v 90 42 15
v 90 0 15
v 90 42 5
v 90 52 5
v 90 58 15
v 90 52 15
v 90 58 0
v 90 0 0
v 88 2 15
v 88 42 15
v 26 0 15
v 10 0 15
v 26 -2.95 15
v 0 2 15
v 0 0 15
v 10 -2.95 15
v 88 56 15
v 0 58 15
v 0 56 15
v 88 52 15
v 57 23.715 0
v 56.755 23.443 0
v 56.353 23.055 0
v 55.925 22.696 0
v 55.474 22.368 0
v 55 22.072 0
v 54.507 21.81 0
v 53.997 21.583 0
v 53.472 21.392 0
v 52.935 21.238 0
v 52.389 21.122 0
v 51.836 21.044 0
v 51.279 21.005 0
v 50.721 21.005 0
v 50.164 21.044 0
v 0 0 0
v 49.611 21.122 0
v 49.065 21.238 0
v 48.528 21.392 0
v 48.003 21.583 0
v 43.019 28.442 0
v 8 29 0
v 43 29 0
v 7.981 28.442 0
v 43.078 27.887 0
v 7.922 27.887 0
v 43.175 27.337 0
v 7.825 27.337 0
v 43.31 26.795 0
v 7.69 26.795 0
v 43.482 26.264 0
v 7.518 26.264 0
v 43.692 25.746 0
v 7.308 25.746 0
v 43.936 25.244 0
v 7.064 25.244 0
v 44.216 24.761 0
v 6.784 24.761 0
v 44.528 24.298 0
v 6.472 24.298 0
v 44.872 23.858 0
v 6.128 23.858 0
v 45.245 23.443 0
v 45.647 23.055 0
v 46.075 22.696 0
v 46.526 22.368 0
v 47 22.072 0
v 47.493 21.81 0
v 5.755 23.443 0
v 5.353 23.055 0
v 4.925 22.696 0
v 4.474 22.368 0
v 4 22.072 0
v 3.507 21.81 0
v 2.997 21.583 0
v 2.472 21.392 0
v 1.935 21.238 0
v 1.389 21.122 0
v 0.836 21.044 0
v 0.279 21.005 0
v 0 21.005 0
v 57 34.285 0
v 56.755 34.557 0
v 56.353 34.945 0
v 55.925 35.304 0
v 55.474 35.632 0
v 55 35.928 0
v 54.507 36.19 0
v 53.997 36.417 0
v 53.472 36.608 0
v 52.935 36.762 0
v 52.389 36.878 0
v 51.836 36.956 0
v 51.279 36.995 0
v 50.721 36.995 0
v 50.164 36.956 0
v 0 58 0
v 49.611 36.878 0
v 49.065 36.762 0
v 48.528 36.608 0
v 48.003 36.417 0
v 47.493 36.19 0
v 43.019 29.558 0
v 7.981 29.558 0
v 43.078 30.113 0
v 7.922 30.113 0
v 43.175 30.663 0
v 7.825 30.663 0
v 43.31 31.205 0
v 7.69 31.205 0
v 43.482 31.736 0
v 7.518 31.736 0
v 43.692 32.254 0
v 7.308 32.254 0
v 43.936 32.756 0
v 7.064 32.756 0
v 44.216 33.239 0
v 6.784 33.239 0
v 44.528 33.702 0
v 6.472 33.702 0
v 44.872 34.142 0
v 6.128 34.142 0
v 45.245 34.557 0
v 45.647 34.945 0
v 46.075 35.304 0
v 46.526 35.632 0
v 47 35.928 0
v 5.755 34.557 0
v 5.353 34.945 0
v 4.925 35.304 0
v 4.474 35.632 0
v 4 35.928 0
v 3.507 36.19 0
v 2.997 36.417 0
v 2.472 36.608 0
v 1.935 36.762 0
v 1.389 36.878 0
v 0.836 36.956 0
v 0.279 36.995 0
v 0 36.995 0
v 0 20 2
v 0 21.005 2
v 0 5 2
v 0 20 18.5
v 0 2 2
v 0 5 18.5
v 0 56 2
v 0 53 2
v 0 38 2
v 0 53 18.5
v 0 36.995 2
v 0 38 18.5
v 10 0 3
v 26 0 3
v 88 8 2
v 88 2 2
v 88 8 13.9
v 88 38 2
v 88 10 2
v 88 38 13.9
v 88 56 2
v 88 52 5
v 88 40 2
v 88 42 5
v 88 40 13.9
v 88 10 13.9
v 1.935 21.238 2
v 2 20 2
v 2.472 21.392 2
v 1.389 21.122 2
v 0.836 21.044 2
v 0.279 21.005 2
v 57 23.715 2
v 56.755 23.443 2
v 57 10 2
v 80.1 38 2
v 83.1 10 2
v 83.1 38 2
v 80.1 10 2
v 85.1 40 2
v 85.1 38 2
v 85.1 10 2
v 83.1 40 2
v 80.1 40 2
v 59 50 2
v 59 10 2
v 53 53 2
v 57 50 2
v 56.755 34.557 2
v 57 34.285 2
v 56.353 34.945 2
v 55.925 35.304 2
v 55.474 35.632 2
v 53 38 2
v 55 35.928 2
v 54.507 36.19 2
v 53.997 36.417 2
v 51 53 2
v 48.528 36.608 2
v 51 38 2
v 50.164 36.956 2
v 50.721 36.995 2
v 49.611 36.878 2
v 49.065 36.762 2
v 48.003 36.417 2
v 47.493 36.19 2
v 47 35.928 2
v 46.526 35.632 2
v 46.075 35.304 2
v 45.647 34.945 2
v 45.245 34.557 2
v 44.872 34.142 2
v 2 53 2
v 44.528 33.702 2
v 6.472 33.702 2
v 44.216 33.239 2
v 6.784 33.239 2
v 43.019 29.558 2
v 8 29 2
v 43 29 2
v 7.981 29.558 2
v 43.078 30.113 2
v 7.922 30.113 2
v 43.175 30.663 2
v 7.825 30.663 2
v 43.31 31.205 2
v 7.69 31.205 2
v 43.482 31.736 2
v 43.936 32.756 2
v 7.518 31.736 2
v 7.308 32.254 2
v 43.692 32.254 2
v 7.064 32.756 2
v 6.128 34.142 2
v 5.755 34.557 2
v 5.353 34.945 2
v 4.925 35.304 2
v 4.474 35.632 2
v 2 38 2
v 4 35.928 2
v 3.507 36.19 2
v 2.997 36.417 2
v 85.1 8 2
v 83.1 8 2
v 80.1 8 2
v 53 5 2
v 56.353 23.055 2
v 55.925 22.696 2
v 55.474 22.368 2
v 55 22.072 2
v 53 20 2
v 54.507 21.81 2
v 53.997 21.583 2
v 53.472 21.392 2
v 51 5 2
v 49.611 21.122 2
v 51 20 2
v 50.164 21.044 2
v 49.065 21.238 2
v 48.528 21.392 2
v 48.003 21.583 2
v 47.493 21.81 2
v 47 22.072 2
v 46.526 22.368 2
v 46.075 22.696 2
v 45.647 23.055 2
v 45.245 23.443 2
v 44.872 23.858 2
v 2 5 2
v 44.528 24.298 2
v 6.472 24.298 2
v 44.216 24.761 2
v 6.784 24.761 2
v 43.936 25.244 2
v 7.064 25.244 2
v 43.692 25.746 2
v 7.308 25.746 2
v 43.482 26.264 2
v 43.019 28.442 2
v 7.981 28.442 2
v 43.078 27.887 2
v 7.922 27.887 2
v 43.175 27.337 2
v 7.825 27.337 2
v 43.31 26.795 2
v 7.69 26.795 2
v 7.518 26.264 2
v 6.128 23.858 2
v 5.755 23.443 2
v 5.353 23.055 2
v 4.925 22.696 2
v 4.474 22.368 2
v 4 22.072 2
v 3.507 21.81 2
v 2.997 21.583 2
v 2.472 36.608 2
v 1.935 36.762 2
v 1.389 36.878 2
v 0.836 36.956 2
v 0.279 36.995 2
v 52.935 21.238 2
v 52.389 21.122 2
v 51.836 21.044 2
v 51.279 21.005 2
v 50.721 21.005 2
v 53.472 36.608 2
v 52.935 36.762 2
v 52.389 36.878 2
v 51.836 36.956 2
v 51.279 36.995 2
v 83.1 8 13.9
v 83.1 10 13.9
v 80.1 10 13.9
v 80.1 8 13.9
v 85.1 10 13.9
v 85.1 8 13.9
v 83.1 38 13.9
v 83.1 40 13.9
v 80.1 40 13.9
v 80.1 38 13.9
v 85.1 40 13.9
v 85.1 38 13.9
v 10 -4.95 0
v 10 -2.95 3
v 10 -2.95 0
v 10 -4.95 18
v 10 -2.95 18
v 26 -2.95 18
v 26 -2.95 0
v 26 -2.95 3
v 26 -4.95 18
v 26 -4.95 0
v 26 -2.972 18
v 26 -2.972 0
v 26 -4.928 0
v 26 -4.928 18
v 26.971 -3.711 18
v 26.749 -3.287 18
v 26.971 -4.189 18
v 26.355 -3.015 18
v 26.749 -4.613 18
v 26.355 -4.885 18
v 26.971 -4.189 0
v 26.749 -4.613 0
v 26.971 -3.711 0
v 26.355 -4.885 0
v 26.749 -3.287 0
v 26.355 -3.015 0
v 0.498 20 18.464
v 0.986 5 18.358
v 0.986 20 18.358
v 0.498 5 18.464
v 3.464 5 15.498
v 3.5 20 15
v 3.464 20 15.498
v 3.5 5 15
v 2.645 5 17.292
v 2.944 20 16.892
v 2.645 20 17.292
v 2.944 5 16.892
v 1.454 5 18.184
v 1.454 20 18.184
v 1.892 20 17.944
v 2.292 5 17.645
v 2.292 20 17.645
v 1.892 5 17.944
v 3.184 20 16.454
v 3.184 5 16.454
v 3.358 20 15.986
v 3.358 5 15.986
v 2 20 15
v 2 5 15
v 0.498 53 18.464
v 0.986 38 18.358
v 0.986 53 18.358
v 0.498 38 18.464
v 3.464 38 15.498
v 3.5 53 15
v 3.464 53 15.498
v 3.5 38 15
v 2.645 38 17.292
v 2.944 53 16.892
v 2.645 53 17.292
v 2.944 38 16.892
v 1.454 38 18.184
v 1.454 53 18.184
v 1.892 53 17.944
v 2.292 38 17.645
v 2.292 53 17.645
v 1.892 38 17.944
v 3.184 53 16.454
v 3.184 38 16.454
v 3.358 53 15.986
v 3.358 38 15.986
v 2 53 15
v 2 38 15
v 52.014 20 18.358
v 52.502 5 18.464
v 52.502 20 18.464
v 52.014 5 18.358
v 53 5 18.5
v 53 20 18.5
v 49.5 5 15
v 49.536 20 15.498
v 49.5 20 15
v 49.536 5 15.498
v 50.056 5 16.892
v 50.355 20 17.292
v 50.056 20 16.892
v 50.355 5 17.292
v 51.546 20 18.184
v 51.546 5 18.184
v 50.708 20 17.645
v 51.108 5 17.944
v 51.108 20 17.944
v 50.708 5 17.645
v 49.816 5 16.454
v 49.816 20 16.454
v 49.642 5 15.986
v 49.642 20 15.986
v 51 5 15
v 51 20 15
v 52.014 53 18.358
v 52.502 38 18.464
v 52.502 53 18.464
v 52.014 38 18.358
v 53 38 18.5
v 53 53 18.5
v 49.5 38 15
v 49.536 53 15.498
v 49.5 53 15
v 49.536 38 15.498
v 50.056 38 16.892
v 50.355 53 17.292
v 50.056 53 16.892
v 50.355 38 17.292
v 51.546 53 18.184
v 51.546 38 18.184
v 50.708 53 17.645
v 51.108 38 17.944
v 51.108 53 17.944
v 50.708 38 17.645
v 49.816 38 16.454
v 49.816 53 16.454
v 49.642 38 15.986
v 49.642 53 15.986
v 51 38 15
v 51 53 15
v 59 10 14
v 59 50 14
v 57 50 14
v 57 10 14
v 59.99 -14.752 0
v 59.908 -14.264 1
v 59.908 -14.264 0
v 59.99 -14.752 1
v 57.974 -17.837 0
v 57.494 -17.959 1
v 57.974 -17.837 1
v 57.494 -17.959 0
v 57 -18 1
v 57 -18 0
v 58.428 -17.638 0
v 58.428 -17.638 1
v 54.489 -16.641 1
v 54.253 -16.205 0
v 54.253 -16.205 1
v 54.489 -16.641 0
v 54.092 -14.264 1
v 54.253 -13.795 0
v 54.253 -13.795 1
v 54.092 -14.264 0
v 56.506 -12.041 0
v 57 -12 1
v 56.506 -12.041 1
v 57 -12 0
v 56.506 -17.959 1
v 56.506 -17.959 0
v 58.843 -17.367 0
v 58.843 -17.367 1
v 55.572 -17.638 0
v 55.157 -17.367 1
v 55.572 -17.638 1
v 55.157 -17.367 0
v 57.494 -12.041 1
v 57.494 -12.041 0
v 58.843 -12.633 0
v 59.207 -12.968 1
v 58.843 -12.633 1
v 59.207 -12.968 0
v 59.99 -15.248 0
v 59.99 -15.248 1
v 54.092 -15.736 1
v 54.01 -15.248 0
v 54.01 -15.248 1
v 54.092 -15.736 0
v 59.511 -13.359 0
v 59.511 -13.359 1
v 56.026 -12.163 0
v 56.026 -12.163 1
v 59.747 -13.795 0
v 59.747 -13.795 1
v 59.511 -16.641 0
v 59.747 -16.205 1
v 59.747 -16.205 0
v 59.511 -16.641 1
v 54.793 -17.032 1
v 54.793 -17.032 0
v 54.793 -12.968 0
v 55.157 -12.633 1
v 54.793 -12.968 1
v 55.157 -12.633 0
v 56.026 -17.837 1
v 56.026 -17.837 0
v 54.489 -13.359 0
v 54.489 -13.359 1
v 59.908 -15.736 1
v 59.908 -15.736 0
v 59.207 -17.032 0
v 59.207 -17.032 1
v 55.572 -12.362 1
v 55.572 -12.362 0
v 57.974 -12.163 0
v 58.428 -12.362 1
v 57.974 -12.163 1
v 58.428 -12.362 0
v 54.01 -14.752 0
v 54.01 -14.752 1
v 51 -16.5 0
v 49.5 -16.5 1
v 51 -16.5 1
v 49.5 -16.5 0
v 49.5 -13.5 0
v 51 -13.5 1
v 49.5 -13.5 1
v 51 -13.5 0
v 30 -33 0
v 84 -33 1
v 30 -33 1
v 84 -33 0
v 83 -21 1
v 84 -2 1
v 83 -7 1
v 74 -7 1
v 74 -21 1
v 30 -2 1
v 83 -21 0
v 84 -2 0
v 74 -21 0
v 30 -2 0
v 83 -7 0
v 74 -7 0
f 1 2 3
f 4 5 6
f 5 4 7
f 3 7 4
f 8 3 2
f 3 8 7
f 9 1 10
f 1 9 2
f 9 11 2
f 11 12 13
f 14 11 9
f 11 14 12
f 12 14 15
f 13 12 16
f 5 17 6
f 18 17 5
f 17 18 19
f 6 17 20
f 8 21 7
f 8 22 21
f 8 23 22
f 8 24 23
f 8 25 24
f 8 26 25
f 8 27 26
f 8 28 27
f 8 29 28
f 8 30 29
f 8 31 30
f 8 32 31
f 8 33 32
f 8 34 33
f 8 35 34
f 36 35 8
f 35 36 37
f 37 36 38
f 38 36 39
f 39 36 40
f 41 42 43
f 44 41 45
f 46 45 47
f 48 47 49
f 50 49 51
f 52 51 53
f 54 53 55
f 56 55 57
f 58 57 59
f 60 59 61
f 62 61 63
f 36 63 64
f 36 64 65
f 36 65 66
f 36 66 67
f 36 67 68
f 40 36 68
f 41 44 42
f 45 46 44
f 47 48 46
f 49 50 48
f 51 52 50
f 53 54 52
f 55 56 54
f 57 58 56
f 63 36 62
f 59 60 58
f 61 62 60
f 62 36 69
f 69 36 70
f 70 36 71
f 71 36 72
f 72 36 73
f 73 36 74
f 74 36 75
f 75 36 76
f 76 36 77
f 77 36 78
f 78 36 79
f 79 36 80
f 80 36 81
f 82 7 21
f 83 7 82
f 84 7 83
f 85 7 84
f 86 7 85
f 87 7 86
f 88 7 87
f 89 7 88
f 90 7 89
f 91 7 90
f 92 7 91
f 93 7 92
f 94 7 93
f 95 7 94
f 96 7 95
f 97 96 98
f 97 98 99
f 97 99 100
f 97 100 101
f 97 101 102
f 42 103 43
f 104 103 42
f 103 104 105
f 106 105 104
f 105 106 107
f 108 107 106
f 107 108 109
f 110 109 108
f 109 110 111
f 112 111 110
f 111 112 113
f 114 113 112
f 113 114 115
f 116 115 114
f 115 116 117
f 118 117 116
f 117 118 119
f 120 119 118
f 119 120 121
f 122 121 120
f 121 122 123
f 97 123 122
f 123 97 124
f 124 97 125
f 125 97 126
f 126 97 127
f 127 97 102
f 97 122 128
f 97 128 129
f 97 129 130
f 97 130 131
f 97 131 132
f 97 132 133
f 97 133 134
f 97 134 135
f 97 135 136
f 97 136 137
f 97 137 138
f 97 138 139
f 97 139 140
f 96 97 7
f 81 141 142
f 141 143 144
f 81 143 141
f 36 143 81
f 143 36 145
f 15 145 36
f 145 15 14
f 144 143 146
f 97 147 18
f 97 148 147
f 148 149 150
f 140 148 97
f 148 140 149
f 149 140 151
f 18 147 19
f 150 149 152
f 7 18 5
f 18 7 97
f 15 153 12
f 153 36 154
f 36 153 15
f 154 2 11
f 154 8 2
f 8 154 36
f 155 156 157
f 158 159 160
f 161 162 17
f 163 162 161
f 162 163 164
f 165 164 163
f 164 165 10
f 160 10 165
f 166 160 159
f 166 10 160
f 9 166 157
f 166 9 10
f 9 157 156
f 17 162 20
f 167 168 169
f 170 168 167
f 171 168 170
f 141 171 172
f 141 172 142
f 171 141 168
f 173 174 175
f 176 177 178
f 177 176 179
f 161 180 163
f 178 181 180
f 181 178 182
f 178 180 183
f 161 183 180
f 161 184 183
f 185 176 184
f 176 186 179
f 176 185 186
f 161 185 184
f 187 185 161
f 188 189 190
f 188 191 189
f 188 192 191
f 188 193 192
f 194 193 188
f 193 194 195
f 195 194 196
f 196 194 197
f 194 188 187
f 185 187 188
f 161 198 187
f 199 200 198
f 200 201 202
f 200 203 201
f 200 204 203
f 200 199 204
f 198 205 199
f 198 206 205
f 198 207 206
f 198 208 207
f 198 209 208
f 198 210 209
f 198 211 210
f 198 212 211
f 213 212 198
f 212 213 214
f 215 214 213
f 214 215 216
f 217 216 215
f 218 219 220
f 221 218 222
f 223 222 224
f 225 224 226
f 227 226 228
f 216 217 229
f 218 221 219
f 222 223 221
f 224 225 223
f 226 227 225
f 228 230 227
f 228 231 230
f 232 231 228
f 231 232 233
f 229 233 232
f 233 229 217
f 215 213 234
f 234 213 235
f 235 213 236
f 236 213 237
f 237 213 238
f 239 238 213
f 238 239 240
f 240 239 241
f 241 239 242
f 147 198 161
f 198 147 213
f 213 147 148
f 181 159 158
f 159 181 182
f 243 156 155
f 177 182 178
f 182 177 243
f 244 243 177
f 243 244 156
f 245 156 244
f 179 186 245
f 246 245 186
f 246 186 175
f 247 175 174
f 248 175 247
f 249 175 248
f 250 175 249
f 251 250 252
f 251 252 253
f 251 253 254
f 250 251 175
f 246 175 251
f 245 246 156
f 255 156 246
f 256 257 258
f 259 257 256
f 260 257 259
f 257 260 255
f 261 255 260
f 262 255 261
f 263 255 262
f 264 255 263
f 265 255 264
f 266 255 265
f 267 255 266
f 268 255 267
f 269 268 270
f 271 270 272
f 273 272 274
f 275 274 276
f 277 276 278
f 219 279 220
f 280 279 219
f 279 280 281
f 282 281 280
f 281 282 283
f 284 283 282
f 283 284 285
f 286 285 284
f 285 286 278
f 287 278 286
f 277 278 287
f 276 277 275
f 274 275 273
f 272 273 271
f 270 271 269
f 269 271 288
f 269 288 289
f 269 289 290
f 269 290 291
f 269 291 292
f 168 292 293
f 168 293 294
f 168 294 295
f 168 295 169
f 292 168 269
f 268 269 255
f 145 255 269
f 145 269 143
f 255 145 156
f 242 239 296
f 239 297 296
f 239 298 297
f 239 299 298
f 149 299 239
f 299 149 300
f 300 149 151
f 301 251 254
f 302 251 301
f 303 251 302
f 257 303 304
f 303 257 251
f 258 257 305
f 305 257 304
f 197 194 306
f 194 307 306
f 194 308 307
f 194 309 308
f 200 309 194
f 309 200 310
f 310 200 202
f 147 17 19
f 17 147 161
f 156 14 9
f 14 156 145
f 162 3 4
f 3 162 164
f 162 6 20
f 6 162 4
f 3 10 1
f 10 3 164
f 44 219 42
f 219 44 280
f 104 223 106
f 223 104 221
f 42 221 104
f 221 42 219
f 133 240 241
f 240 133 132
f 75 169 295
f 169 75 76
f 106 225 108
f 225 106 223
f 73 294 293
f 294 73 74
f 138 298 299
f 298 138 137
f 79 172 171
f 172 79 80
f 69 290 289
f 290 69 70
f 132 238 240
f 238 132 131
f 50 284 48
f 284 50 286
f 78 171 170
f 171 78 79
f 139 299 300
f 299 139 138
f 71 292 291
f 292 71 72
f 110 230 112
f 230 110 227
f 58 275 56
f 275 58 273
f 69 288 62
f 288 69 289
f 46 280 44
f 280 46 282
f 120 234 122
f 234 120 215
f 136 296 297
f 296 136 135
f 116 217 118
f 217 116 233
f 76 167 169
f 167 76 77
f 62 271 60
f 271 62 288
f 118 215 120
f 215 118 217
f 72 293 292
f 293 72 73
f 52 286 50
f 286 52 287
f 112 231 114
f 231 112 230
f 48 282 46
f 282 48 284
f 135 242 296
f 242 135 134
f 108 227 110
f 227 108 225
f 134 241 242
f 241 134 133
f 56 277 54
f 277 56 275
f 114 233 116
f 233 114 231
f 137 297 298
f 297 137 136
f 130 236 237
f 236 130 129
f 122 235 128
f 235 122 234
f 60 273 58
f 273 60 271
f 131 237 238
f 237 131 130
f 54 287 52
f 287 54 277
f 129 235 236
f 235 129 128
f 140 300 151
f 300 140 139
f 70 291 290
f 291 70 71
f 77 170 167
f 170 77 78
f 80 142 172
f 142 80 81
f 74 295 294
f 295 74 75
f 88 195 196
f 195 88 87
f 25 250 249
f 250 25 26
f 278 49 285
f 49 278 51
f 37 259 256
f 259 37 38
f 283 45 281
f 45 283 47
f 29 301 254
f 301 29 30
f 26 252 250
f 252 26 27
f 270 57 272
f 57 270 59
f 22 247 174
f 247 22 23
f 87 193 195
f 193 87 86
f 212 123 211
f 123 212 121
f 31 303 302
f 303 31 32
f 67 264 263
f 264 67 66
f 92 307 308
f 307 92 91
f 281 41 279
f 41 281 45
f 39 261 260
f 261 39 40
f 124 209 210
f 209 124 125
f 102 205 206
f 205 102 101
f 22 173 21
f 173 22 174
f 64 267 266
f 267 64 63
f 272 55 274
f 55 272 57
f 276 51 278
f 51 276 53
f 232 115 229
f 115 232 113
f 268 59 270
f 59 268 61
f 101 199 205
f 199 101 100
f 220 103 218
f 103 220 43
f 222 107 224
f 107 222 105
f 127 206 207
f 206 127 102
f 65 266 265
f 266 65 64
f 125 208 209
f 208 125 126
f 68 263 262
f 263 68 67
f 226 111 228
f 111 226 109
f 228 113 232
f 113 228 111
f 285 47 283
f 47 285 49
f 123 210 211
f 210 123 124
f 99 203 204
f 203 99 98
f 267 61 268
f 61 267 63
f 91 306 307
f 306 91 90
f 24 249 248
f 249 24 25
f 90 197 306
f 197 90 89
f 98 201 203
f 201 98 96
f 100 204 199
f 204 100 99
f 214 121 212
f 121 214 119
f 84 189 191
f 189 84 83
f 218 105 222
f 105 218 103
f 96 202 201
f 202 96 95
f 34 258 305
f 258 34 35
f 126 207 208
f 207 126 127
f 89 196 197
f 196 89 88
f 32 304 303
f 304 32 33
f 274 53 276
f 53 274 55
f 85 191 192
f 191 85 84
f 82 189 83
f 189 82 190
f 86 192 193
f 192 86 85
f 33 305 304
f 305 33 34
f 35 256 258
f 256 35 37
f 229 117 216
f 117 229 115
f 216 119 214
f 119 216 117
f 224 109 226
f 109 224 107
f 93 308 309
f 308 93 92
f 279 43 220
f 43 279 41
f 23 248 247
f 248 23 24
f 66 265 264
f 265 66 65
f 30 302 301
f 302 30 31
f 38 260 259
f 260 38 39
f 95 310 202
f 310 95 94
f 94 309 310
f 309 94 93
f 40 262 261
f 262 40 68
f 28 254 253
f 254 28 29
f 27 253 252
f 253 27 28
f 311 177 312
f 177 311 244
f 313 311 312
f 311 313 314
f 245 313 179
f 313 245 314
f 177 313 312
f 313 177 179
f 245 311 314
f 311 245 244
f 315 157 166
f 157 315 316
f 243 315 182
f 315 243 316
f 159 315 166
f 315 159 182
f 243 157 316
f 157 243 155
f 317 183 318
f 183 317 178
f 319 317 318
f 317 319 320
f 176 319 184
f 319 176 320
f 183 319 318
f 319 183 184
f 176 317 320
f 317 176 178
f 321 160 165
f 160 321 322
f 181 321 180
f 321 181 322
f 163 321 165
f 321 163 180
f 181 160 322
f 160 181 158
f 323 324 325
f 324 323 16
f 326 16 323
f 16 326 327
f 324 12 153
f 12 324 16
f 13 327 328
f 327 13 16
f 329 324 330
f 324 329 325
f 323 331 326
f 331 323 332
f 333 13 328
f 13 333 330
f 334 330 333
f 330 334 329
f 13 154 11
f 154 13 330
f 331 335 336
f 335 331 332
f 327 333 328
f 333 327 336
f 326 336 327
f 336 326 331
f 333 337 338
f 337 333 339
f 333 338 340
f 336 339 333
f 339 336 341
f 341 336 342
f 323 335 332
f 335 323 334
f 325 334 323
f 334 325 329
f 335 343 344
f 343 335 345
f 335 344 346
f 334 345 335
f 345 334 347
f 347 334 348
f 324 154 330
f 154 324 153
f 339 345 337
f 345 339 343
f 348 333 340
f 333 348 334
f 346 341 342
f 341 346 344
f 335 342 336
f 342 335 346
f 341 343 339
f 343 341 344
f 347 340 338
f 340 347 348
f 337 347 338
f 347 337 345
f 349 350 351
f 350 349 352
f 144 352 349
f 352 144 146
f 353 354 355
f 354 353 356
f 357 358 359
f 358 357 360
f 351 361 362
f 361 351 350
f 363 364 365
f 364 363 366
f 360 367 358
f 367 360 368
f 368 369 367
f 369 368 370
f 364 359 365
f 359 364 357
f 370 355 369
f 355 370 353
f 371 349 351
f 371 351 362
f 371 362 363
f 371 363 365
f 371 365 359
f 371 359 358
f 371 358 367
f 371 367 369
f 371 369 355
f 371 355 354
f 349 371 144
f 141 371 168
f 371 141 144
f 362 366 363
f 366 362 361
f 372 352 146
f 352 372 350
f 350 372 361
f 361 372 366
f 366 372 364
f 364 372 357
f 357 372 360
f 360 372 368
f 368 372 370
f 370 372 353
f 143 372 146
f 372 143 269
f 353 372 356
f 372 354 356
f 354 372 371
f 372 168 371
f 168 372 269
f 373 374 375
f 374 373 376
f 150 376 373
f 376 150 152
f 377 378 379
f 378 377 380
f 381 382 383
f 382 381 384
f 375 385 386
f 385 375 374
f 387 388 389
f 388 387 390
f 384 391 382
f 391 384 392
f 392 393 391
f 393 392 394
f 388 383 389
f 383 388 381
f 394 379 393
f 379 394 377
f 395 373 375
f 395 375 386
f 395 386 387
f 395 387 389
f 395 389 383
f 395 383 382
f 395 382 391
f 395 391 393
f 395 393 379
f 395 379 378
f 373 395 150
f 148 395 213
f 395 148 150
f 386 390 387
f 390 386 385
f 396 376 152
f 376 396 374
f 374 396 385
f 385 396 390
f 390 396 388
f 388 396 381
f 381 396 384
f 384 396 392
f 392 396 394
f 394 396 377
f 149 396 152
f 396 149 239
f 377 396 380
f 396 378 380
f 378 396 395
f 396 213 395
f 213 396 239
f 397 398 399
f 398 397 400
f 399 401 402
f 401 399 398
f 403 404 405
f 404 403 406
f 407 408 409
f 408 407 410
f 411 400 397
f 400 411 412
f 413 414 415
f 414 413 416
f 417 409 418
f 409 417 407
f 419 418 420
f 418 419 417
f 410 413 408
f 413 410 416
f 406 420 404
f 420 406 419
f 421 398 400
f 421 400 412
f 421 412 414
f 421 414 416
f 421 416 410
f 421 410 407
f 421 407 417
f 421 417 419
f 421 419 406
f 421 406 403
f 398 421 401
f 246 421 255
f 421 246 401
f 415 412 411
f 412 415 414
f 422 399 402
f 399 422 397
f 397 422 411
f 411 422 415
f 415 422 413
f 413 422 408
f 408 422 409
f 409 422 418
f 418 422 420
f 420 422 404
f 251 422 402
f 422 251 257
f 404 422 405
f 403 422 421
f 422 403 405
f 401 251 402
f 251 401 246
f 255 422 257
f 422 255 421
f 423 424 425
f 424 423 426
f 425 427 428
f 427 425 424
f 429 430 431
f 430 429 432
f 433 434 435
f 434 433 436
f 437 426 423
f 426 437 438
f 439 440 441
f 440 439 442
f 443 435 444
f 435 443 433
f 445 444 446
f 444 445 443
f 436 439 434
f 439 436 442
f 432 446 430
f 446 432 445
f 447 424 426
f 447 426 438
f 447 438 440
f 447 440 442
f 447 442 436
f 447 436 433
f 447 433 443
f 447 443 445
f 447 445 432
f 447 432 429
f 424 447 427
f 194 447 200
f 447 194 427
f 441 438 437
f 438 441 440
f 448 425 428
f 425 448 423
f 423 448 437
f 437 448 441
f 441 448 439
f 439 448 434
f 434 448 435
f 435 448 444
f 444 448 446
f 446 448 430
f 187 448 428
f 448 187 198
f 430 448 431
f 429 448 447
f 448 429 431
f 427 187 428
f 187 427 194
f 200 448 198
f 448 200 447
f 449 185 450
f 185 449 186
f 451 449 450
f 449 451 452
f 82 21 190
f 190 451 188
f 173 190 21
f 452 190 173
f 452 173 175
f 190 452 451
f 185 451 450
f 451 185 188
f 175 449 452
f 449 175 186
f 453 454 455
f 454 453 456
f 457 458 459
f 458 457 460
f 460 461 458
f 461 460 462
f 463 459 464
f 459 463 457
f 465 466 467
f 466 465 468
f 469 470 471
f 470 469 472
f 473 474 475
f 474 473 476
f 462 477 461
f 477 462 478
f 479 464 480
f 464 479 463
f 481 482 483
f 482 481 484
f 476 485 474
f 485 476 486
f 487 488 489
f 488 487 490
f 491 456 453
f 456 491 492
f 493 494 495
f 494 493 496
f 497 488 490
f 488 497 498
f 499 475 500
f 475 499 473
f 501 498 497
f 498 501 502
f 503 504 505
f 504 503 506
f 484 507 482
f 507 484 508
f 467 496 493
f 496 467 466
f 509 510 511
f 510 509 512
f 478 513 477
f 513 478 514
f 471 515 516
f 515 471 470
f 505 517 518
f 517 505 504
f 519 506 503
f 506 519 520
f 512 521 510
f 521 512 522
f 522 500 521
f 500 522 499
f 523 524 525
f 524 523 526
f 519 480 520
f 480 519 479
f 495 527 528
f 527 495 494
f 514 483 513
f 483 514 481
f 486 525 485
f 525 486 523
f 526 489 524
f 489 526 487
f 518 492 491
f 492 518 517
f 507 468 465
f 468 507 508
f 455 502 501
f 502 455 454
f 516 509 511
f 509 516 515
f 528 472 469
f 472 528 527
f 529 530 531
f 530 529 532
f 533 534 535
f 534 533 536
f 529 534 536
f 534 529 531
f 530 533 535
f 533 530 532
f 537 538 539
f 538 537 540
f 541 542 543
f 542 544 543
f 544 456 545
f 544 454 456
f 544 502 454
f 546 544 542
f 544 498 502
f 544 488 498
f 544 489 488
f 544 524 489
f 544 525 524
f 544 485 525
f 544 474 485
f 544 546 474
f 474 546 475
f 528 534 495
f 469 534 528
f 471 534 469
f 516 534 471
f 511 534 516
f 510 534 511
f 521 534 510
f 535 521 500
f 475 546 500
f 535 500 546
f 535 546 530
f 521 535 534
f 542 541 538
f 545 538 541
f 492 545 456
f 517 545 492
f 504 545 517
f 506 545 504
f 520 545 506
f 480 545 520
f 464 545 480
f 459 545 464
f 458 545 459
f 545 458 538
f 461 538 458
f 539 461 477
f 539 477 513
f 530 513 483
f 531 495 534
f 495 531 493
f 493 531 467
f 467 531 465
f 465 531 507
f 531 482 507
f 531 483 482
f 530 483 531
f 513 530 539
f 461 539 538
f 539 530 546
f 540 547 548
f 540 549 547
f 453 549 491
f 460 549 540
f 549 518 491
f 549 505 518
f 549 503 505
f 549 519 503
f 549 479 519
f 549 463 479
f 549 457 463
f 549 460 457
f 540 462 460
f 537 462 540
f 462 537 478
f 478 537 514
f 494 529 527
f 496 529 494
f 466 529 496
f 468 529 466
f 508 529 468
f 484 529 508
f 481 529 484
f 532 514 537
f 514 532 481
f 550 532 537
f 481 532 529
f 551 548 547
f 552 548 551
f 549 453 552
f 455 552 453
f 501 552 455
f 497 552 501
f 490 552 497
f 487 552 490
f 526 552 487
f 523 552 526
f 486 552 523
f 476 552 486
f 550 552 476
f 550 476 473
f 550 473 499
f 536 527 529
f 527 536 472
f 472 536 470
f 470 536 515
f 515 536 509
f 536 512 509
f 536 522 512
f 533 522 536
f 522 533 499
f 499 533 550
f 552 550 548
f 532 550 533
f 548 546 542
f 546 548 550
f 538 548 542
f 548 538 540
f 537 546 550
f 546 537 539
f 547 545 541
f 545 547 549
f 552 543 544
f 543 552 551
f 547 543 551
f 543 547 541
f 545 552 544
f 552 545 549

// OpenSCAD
$fa = 4;
$fs = 0.5;

//hotshoe dimensions
width = 18;
center_width = 12;
length = 16;
height = 2;

//the module for batteries (4xAAA) is in "../../robot/battery.scad".

electr();
translate([30,-2,0]) rotate([0,0,-90]) cover();

module hotshoe(center_height = 3) {
	union() {
		cube([length,width,height]);
		translate([0,(width-center_width)/2,0]) cube([length, center_width, height+center_height]);
		translate([0,0,height/2]) rotate([-90,0,0]) cylinder(r = height/2, h = width);
	}
}

module electr() {
	union(){
		shell();
		translate([80.1,8,1.9]) pcb_vice();
		translate([26,-4.95,0]) rotate([-90,0,0]) rotate([0,0,180]) hotshoe();
		translate([0,5,0]) rotate([0,-90,-90]) grip(2,3.5,18.5,15);
		translate([0,38,0]) rotate([0,-90,-90]) grip(2,3.5,18.5,15);
		translate([53,20,0]) rotate([0,-90,90]) grip(2,3.5,18.5,15);
		translate([53,53,0]) rotate([0,-90,90]) grip(2,3.5,18.5,15);
		translate([57,10,0]) cube([2,40,14]);
	}
}

module cover(){
	difference(){
		cube([31,54,1]);
		//pot
		translate([13,27,-1]) {
			cylinder(r=3,h=3);
			translate([-1.5,-7.5,0]) cube([3,1.5,3]);
		}
		//switch
		translate([5,44,-1]) cube([14,9,3]);
	}
}

module pcb_vice(w = 30) {
	union(){
		translate([0,0,0]) cube([3,2,12]);
		translate([5,0,0]) cube([3,2,12]);
		translate([0,w,0]) cube([3,2,12]);
		translate([5,w,0]) cube([3,2,12]);
	}
}

module shell() {
	difference() {
		cube([90,58,15]);
		translate([-1,2,2]) cube([89,54,14]);
		translate([85,42,5]) cube([10,10,11]);
		translate([0,29,-1]) cylinder(r=8, h=20);
		translate([48+2+1,29,-1]) cylinder(r=8, h=20);
	}
}

module grip(w1, w2, length, height) {
	union() {
		cube([length-w2,w1,height]);
		translate([length-w2,0,0]) intersection() {
			cylinder(r=w2, h=height);
			cube([w2,w2,height]);
		}
	}
}
